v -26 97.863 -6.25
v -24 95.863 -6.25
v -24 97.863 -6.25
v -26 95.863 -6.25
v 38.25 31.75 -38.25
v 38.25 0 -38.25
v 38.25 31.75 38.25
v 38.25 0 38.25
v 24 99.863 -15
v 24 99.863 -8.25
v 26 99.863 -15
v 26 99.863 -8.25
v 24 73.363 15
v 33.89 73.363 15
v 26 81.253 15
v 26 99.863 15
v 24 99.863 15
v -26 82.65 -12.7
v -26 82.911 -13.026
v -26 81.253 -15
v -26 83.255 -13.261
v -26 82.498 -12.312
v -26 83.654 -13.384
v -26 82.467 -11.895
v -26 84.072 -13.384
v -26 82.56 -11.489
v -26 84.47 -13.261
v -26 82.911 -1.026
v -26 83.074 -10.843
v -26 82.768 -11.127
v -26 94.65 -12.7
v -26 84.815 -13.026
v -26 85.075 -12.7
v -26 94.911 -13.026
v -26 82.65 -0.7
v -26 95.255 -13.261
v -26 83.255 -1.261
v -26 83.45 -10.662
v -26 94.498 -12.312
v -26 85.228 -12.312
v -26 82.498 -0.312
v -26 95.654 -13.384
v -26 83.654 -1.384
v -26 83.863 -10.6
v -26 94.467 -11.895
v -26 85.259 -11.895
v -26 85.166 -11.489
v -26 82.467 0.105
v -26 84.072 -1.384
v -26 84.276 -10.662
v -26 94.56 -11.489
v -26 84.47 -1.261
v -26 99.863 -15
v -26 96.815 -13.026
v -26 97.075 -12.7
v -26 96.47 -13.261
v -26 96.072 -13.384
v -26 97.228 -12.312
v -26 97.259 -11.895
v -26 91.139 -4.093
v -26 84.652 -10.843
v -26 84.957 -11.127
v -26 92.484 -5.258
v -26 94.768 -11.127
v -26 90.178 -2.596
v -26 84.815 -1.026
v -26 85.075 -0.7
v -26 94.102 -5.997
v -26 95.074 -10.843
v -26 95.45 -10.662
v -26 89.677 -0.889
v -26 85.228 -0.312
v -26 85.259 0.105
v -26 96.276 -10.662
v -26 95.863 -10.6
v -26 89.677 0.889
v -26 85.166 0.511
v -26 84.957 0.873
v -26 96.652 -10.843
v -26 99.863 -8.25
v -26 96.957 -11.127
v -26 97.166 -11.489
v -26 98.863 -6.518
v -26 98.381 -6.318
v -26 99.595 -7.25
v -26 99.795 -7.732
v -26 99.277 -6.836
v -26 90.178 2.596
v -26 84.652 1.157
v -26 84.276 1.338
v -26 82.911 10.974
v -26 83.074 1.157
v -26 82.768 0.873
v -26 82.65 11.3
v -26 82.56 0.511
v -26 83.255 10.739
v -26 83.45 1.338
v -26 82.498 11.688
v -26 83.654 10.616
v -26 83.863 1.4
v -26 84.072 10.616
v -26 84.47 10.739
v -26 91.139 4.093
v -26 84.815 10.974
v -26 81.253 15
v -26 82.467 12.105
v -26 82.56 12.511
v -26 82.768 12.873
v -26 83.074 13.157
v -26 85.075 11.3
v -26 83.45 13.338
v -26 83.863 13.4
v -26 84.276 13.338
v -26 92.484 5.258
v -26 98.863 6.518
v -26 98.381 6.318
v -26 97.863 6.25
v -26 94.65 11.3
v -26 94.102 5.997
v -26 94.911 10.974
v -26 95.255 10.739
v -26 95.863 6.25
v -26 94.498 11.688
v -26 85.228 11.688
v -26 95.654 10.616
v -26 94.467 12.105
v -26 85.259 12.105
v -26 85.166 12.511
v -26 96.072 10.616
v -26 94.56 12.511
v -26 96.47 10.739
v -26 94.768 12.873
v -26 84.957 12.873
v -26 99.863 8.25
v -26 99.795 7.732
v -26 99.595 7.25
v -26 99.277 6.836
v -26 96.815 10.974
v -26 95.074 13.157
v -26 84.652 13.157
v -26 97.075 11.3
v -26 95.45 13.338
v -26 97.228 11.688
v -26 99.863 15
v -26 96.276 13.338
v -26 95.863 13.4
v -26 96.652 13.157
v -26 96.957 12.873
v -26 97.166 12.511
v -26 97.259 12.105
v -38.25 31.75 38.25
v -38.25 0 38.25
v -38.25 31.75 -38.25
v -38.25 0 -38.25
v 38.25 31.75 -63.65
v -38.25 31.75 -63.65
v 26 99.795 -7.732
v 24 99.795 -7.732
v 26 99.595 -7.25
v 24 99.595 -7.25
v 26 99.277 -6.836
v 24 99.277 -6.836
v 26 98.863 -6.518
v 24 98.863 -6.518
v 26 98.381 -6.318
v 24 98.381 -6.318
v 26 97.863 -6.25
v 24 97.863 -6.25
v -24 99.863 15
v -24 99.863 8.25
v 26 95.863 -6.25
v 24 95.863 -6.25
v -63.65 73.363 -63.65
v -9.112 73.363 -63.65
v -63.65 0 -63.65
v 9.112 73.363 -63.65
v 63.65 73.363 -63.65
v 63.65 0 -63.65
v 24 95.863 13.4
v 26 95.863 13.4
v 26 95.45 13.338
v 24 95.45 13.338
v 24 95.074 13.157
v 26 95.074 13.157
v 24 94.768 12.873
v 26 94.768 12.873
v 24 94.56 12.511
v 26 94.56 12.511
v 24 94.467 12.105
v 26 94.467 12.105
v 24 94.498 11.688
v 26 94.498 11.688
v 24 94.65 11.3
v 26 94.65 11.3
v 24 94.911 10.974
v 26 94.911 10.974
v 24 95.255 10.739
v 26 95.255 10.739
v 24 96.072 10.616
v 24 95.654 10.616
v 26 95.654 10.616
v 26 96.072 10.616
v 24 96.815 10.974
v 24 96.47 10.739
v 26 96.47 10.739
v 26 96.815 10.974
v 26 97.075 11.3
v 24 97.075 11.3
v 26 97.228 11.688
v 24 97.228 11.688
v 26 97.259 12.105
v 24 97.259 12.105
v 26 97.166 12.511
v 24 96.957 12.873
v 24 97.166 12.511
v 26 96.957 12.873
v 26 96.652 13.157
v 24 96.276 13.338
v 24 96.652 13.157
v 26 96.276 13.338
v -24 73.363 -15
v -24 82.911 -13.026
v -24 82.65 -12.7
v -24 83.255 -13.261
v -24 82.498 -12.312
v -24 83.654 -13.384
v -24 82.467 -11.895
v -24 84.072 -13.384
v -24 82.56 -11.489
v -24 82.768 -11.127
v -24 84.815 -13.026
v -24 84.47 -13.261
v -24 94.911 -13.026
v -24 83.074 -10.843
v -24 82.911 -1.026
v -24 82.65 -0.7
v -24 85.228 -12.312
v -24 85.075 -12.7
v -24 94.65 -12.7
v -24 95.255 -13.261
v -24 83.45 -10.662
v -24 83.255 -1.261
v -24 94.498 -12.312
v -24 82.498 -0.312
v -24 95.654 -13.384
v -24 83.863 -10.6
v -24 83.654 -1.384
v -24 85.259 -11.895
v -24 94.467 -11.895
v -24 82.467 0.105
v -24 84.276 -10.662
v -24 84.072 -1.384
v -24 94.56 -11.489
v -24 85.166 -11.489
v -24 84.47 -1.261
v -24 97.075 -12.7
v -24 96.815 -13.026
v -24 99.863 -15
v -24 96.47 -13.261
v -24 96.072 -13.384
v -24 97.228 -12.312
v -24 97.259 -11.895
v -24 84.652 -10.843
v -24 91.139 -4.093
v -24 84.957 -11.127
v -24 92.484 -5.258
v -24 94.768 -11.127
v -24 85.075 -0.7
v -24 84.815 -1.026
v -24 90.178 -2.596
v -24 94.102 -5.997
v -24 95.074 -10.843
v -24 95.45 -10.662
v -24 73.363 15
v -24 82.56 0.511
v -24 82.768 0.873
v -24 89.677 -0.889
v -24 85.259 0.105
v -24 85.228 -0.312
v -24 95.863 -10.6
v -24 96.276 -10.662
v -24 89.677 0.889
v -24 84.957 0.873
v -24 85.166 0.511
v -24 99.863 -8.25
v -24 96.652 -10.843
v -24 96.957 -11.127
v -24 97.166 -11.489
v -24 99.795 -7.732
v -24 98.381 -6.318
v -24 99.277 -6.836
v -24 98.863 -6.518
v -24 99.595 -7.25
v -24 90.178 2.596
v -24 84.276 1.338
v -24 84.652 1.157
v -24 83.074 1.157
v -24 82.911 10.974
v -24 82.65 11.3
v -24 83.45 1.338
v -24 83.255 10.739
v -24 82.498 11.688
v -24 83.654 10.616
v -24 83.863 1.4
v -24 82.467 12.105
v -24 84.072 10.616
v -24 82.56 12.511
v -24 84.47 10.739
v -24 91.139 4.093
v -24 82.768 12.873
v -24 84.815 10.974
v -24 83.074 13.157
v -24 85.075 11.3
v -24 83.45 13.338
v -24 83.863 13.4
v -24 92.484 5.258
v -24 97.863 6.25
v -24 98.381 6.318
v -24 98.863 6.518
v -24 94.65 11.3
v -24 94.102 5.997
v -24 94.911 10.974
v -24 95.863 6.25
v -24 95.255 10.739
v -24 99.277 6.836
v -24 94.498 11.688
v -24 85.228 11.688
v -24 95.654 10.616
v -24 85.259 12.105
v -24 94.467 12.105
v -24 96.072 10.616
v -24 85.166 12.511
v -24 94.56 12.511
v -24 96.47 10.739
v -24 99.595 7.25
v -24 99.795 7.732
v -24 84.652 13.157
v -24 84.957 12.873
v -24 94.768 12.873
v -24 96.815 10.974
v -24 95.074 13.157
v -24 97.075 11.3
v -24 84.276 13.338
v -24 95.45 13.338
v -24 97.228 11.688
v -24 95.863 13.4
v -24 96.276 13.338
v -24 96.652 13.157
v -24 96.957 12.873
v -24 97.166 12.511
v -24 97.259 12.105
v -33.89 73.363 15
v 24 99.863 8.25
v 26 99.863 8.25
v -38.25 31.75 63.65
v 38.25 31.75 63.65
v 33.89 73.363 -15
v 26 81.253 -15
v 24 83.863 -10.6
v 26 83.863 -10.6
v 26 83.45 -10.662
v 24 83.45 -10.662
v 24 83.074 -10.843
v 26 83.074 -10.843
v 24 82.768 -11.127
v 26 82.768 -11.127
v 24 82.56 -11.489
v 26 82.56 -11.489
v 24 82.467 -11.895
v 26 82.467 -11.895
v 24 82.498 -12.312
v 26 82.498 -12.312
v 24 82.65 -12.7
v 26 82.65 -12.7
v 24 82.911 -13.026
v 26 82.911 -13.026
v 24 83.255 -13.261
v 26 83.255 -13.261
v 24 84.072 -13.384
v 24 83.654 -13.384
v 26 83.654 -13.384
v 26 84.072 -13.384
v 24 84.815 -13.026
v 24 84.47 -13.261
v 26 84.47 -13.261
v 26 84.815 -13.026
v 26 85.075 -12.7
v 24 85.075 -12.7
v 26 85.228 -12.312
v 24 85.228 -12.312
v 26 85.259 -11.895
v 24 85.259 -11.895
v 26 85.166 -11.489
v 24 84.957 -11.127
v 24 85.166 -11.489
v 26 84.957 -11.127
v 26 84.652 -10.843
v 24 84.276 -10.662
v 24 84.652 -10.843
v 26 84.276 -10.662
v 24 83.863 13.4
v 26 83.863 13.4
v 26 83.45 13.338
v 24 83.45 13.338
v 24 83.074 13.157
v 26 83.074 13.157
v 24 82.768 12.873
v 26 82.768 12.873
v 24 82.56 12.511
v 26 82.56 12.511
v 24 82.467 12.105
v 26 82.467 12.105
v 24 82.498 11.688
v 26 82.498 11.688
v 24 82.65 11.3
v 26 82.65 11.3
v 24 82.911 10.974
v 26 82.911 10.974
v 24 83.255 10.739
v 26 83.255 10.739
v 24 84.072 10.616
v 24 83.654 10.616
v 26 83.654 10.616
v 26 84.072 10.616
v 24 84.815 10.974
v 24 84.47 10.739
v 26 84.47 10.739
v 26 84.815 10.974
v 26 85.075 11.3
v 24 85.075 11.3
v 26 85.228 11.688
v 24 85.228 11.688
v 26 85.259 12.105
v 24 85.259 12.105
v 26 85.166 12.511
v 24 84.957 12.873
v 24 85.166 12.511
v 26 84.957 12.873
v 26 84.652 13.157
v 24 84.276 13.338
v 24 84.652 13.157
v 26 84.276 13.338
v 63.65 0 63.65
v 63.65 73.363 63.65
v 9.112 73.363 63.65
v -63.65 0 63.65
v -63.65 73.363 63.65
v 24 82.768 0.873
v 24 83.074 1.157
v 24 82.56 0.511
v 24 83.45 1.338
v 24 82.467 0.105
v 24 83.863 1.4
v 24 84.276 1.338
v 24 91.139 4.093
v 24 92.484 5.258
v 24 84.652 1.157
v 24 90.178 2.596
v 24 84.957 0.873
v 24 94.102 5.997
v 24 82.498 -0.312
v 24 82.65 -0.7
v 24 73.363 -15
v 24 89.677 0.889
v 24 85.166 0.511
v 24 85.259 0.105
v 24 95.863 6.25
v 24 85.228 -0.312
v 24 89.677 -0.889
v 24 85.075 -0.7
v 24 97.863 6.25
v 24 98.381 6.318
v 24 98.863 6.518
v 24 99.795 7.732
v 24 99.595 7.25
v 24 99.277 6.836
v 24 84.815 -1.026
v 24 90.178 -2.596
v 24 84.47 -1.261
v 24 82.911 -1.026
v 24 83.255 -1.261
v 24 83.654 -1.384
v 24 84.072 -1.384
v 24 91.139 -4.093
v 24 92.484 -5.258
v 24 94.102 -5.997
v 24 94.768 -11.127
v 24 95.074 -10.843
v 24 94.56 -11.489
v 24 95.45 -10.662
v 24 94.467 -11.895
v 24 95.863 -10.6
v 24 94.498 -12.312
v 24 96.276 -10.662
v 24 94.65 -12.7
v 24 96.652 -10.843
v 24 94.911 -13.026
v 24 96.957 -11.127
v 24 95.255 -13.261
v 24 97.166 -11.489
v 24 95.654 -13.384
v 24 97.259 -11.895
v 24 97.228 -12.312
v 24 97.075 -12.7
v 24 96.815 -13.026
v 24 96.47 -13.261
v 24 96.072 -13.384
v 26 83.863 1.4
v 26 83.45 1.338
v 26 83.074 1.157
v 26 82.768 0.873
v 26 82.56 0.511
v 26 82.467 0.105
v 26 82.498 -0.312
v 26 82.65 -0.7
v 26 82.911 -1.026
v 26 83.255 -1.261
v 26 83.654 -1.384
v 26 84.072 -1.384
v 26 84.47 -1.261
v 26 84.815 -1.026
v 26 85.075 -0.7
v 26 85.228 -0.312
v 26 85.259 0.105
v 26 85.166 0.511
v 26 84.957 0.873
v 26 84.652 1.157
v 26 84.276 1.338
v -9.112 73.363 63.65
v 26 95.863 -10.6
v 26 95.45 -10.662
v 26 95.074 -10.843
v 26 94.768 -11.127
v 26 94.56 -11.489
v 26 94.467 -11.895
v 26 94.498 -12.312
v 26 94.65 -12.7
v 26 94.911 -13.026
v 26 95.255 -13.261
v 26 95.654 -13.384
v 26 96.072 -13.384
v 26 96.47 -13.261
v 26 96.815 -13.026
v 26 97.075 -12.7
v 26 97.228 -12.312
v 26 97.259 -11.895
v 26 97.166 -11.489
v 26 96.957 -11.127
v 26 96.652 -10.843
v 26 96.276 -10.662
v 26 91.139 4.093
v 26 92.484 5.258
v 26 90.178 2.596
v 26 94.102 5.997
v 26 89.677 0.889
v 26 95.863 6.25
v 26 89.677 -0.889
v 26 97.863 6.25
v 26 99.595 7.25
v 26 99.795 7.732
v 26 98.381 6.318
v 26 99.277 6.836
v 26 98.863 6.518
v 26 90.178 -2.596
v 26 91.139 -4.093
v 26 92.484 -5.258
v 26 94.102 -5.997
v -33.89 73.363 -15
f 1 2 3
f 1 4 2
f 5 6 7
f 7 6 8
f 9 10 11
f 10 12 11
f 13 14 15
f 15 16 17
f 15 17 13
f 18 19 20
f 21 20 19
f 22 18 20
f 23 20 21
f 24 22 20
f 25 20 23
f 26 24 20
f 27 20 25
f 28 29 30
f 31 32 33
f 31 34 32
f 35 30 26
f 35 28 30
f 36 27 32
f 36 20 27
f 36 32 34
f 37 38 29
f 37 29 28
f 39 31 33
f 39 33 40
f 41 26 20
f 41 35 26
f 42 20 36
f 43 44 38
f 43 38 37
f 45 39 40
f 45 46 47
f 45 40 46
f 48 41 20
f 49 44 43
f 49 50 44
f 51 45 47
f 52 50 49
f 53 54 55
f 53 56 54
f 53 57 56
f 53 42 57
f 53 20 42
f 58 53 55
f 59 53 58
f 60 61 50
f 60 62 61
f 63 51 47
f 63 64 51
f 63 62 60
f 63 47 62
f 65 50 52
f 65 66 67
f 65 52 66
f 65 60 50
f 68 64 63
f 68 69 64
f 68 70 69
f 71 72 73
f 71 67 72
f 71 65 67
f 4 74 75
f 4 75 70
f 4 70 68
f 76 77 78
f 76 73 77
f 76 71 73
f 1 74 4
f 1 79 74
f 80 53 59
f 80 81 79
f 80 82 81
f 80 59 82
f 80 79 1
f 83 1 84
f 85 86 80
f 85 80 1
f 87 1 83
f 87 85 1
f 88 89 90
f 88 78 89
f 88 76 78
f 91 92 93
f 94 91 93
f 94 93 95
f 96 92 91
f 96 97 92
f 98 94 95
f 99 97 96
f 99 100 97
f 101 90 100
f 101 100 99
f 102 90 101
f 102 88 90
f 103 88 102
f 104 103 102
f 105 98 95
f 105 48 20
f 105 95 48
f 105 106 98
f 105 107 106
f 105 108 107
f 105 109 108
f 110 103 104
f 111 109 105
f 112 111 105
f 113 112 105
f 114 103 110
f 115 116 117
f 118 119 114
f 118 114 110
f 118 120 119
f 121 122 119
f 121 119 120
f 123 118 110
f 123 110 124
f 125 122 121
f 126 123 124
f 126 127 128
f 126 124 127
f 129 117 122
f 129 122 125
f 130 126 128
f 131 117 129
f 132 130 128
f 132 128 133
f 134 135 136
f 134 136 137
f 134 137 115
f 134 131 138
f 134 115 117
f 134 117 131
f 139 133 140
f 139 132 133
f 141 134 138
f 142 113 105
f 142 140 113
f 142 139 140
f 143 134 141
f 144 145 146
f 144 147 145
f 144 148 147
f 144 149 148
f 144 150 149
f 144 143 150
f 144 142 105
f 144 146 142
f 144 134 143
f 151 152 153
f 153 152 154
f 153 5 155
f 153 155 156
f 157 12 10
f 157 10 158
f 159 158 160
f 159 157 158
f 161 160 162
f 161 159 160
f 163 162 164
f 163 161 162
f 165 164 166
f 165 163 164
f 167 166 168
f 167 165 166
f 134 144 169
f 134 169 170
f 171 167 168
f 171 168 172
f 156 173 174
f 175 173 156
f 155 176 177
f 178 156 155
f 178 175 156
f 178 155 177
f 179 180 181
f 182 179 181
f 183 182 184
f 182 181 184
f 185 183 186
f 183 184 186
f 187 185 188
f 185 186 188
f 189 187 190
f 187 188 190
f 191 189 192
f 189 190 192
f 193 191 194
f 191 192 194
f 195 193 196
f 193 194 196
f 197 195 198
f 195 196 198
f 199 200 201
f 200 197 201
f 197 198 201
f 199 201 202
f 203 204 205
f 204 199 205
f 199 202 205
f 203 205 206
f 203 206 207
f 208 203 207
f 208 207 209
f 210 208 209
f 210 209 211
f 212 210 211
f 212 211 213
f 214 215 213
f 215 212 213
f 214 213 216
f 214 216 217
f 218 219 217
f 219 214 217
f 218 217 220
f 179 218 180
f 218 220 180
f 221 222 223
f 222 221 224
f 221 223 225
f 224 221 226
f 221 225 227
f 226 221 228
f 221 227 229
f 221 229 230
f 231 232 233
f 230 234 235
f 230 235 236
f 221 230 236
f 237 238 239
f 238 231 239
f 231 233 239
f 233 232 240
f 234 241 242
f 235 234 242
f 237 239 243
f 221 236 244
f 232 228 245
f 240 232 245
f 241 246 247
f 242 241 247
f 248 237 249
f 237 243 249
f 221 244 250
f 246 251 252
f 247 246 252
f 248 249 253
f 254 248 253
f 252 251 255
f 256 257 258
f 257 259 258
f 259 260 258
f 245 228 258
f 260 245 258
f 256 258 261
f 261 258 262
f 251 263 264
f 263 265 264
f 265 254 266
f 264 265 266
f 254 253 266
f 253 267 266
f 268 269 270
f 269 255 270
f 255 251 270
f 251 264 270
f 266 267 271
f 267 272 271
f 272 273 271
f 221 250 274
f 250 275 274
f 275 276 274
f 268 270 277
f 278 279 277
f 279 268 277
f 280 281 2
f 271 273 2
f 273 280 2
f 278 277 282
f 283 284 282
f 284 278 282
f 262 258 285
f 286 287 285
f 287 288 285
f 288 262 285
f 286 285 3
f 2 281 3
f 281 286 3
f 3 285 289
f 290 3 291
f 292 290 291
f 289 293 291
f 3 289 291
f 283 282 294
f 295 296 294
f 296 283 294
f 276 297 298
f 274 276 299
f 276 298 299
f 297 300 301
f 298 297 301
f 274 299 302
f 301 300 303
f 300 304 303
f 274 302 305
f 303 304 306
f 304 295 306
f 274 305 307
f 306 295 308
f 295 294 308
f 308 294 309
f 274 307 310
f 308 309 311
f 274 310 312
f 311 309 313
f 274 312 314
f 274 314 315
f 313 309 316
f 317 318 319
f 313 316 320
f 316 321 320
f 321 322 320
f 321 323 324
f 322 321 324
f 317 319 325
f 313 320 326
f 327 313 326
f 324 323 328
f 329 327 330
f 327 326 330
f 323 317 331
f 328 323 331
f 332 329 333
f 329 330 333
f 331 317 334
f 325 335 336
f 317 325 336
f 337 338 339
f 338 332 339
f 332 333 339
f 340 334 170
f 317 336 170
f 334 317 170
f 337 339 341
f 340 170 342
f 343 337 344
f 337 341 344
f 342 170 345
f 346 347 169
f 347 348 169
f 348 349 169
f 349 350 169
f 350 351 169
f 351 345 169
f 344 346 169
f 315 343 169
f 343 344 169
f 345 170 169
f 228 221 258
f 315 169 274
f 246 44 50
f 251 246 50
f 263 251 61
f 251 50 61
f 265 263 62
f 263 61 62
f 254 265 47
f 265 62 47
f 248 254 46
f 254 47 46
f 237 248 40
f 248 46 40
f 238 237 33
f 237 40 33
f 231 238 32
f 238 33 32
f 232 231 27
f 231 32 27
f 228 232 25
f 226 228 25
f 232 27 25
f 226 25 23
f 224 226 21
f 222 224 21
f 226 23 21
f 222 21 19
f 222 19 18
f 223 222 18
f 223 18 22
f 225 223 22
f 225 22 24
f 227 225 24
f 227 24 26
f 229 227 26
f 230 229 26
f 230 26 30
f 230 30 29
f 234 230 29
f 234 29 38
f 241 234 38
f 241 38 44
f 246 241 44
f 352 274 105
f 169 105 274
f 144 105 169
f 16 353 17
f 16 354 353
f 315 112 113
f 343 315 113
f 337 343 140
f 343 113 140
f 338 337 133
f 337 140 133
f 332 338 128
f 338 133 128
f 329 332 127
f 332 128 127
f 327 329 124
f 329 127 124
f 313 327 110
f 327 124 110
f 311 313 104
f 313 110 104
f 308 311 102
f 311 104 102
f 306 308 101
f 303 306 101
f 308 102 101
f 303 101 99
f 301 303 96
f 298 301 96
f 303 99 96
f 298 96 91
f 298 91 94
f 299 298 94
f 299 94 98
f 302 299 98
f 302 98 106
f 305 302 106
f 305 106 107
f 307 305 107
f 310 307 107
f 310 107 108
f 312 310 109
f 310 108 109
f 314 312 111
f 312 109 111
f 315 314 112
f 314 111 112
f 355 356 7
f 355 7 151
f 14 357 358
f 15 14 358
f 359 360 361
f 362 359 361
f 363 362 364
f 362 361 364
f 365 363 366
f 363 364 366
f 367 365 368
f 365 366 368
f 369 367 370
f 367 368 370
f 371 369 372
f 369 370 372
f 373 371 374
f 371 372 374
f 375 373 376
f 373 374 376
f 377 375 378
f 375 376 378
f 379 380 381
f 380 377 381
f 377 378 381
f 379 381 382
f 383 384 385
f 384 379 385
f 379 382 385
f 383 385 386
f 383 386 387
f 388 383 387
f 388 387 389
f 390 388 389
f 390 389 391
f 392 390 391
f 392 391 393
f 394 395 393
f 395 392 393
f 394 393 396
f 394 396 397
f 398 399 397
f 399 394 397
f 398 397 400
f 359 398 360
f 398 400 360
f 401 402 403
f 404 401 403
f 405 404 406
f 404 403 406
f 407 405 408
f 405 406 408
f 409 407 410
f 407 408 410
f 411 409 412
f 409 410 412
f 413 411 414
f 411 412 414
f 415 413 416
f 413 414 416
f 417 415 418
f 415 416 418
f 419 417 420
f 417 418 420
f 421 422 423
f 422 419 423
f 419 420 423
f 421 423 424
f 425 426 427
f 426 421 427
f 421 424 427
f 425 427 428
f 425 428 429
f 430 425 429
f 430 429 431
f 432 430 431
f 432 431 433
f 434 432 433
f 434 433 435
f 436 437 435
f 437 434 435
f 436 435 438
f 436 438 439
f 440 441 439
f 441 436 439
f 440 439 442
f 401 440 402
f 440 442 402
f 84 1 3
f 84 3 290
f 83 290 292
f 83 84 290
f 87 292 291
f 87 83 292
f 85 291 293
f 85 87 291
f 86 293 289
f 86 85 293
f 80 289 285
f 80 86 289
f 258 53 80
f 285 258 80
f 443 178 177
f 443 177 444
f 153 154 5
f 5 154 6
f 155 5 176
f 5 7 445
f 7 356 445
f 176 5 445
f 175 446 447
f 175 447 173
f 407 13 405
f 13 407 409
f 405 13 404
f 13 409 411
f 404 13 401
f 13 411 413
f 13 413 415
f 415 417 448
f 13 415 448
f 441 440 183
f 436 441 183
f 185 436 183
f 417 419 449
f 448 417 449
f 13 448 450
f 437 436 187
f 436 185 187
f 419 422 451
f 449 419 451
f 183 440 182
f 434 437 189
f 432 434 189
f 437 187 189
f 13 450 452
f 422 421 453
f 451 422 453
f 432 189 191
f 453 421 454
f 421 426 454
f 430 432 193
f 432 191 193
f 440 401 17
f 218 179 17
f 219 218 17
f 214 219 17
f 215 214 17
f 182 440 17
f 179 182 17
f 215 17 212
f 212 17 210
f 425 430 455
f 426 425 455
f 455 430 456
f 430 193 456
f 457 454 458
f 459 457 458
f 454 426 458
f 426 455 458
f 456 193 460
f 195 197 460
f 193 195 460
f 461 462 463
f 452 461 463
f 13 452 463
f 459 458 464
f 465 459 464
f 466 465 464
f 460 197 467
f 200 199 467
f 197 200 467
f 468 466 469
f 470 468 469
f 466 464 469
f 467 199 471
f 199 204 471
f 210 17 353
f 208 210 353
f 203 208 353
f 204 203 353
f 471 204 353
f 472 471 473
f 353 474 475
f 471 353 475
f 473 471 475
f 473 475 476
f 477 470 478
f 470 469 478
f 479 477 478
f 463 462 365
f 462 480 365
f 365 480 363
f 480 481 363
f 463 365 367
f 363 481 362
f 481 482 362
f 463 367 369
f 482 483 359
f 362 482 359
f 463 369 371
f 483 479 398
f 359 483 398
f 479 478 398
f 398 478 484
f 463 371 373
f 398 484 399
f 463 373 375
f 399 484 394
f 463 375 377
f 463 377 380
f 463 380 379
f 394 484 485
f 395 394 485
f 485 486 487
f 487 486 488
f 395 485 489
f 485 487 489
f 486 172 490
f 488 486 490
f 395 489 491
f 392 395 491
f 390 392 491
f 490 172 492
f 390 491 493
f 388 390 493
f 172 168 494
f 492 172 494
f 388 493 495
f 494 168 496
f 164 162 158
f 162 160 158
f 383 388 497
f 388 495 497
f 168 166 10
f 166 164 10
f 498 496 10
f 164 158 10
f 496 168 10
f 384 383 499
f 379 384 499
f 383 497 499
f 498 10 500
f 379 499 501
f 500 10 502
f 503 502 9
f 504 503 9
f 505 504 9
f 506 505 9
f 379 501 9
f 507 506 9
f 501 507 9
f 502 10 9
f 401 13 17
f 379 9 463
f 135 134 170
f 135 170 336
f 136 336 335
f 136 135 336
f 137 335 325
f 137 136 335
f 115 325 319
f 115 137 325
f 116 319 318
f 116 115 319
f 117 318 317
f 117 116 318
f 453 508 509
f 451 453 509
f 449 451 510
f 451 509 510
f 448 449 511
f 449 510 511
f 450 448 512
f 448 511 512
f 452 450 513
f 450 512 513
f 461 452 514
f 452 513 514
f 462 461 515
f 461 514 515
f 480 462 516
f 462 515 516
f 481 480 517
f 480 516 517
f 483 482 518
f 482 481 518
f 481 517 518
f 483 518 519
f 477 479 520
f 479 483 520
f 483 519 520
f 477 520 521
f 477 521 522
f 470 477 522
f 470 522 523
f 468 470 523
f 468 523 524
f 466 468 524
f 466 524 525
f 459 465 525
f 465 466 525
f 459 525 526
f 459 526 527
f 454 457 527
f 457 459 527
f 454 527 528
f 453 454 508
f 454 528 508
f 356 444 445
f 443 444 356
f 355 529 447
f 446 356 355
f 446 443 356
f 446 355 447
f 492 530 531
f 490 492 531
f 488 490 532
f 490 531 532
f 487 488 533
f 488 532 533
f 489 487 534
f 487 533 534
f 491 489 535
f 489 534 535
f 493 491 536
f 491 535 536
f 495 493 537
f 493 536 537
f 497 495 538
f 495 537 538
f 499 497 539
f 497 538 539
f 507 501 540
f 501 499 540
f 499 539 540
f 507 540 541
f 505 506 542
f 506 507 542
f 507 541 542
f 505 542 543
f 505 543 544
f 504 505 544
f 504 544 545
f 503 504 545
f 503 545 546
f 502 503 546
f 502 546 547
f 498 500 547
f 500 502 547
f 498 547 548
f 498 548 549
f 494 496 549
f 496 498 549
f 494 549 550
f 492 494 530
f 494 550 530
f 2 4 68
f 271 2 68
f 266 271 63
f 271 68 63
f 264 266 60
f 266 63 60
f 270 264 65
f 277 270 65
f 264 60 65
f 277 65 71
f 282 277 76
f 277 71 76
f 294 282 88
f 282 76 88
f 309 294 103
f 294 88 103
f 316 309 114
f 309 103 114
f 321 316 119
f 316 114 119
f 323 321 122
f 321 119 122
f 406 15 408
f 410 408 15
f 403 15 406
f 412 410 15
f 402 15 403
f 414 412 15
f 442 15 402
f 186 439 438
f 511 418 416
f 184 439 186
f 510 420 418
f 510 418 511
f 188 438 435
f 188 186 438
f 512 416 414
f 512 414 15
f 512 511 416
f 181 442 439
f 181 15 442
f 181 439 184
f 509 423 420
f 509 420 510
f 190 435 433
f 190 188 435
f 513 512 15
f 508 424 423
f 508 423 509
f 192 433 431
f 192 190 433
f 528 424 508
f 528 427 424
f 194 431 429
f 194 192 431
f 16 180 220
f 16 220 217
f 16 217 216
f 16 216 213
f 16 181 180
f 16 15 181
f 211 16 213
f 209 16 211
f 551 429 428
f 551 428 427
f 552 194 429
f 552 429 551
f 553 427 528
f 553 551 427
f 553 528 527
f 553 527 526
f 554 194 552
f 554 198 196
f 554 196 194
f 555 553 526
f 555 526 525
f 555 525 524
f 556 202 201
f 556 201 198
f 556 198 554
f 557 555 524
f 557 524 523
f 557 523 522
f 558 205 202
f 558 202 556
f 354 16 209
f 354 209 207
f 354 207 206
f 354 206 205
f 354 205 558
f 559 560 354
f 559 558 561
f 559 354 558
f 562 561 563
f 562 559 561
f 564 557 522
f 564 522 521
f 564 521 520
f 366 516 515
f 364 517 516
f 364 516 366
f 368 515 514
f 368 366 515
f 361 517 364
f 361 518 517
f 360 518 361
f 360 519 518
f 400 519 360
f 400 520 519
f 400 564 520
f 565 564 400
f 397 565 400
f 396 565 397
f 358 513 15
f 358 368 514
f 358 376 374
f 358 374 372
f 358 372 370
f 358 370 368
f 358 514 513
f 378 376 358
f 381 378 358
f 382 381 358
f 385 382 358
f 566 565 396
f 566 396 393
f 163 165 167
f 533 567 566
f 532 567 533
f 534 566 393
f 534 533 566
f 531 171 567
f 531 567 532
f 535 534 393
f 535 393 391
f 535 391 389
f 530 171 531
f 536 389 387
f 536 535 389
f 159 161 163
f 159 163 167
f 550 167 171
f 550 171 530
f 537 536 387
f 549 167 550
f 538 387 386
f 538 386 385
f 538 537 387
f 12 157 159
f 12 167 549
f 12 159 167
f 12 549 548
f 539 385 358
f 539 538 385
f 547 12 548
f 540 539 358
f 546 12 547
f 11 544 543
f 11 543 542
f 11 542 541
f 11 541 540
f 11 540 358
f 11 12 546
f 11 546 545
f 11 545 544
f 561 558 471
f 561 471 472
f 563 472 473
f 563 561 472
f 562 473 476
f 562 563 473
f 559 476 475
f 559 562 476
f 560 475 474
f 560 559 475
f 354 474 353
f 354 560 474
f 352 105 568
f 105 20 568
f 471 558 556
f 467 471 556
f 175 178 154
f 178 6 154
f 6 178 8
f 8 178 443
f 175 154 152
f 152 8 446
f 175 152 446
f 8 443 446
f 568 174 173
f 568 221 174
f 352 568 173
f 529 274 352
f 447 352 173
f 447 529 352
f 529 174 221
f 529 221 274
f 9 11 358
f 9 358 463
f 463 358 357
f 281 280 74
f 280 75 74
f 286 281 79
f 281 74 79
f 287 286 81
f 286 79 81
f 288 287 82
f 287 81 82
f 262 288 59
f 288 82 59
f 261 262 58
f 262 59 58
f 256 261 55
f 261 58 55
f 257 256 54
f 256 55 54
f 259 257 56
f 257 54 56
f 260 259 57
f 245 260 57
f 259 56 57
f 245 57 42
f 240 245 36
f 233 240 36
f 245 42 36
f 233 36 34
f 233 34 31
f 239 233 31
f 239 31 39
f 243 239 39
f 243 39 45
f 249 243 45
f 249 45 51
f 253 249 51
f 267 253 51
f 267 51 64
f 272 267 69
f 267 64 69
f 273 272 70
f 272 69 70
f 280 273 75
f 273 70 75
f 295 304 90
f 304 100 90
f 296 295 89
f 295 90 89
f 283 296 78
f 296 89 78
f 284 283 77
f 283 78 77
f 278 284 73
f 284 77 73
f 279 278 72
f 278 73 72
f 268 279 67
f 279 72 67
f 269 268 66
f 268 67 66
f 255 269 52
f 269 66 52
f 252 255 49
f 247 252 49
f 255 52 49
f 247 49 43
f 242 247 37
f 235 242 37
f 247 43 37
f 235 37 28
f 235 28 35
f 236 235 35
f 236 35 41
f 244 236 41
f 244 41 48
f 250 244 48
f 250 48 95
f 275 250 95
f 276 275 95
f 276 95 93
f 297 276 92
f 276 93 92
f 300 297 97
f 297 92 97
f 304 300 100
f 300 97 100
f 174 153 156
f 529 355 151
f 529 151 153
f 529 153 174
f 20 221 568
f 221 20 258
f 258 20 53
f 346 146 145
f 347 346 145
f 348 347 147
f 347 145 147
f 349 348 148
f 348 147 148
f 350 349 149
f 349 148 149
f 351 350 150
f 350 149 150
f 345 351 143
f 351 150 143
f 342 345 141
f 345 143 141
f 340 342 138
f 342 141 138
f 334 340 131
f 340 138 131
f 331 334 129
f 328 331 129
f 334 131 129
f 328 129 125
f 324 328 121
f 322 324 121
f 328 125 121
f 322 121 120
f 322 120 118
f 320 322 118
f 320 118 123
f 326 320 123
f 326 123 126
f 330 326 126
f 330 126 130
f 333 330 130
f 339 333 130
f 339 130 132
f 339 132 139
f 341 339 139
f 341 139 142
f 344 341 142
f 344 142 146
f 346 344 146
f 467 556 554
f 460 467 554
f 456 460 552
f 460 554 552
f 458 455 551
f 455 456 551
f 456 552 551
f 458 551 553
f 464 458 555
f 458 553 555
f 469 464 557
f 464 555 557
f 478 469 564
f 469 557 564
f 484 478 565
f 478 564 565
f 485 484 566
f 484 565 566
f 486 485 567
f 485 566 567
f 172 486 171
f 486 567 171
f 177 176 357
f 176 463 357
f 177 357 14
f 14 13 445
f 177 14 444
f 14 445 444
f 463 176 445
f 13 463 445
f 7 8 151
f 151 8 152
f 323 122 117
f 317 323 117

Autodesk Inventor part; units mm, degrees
ref_plane "XZ Plane" through (0, 0, 0) normal (0, 1, 0) x (-1, 0, 0)
ref_plane "XY Plane" through (0, 0, 0) normal (0, 0, 1) x (1, 0, 0)
sketch "Sketch1" plane through (0, 0, 0) normal (0, 1, 0) x (-1, 0, 0)
  line L0 (-38.25, 38.25) -> (38.25, 38.25)
  line L1 (38.25, 38.25) -> (38.25, -38.25)
  line L2 (38.25, -38.25) -> (-38.25, -38.25)
  line L3 (-38.25, -38.25) -> (-38.25, 38.25)
  line L4 (63.65, -63.65) -> (-63.65, -63.65)
  line L5 (-63.65, -63.65) -> (-63.65, 63.65)
  line L6 (-63.65, 63.65) -> (63.65, 63.65)
  line L7 (63.65, 63.65) -> (63.65, -63.65)
  point P0 (0, 0)
  point P1 (38.25, 0)
  point P2 (0, -38.25)
  point P3 (63.65, 0)
  point P4 (0, -63.65)
  dimension "d0" = 76.5
  dimension "d1" = 76.5
  dimension "d2" = 25.4
  dimension "d3" = 25.4
extrude "Extrusion1" add sketch "Sketch1" along normal blind 31.75
sketch "Sketch2" plane through (-63.65, 0, 63.65) normal (0, 0, 1) x (1, 0, 0)
  line L0 (127.3, 0) -> (127.3, 31.75) construction
  line L1 (0, 31.75) -> (127.3, 31.75) construction
  line L2 (101.9, 0) -> (101.9, 31.75) construction
  line L3 (101.9, 31.75) -> (72.7623, 73.3629)
  line L4 (101.9, 31.75) -> (152.7, 31.75) construction
  line L5 (63.65, 0) -> (63.65, 31.75)
  line L6 (72.7623, 73.3629) -> (127.3, 73.3629)
  line L7 (127.3, 73.3629) -> (127.3, 31.75)
  line L8 (25.4, 31.75) -> (54.5377, 73.3629)
  line L9 (25.4, 31.75) -> (-25.4, 31.75) construction
  line L10 (54.5377, 73.3629) -> (0, 73.3629)
  line L11 (0, 73.3629) -> (0, 31.75)
  line L12 (0, 31.75) -> (127.3, 31.75)
  dimension "d6" = 125
  dimension "d7" = 50.8
extrude "Extrusion2" add sketch "Sketch2" against normal up to surface (127.3 mm away)
sketch "Sketch3" plane through (9.1123, 73.3629, 63.65) normal (0, 1, 0) x (1, 0, 0)
  line L0 (-33.1123, 48.65) -> (-33.1123, 78.65)
  line L1 (-33.1123, 78.65) -> (-35.1123, 78.65)
  line L2 (-35.1123, 78.65) -> (-35.1123, 48.65)
  line L3 (-35.1123, 48.65) -> (-33.1123, 48.65)
  line L4 (16.8877, 48.65) -> (16.8877, 78.65)
  line L5 (16.8877, 78.65) -> (14.8877, 78.65)
  line L6 (14.8877, 78.65) -> (14.8877, 48.65)
  line L7 (14.8877, 48.65) -> (16.8877, 48.65)
  line L8 (-18.2246, 0) -> (-18.2246, 127.3) construction
  line L9 (-33.1123, 63.65) -> (14.8877, 63.65) construction
  point P0 (-9.1123, 63.65)
  point P1 (-18.2246, 63.65)
  point P2 (-9.1123, 63.65)
  dimension "d10" = 30
  dimension "d11" = 2
  dimension "d12" = 30
  dimension "d13" = 2
  dimension "d14" = 48
extrude "Extrusion3" add sketch "Sketch3" along normal blind 2
sketch "Sketch4" plane through (-26, 73.3629, 15) normal (-1, 0, 0) x (0, 0, 1)
  line L0 (0, 0) -> (-30, 0) construction
  line L1 (-30, 2) -> (0, 2) construction
  line L2 (0, 2) -> (-30, 2) construction
  line L3 (0, 2) -> (0, 26.5)
  line L4 (-30, 0) -> (0, 0) construction
  line L5 (0, 0) -> (-30, 0)
  line L6 (-30, 0) -> (-30, 2)
  line L7 (0, 0) -> (0, 2)
  line L8 (-30, 2) -> (0, 2)
  line L9 (-30, 2) -> (-30, 26.5)
  arc A0 (-21.25, 22.5) -> (-8.75, 22.5) centre (-15, 22.5) ccw
  line L10 (-21.25, 22.5) -> (-21.25, 24.5)
  line L11 (-8.75, 22.5) -> (-8.75, 24.5)
  line L12 (-30, 26.5) -> (-23.25, 26.5)
  line L13 (0, 26.5) -> (-6.75, 26.5)
  arc A1 (-21.25, 24.5) -> (-23.25, 26.5) centre (-23.25, 24.5) ccw
  arc A2 (-6.75, 26.5) -> (-8.75, 24.5) centre (-6.75, 24.5) ccw
  circle A3 centre (-3, 22.5) radius 1.4
  circle A4 centre (-3, 10.5) radius 1.4
  circle A5 centre (-15, 10.5) radius 1.4
  circle A6 centre (-27, 10.5) radius 1.4
  circle A7 centre (-27, 22.5) radius 1.4
  line L14 (-27, 10.5) -> (-15, 10.5) construction
  line L15 (-15, 10.5) -> (-3, 10.5) construction
  point P0 (-15, -73.3629)
  point P1 (-15, 2)
  point P2 (-15, 16.25)
  dimension "d17" = 26.5
  dimension "d18" = 12.5
  dimension "d19" = 22.5
  dimension "d20" = 2
  dimension "d21" = 2.8
  dimension "d22" = 12
  dimension "d23" = 24
extrude "Extrusion4" add sketch "Sketch4" against normal blind 2 contours L8 L9 L12 A1 L10 A0 L11 A2 L13 L3
sketch "Sketch5" plane through (-24, 73.3629, -15) normal (0, 0, -1) x (-1, 0, 0)
  line L0 (2, 0) -> (0, 0) construction
  line L1 (1, 8.89) -> (9.89, 0)
  line L2 (-14.8877, 0) -> (39.65, 0) construction
  line L3 (1, 8.89) -> (13.5724, 8.89) construction
  line L4 (1, 8.89) -> (-7.89, 0)
  line L5 (1, 8.89) -> (13.5724, 8.89) construction
  line L6 (1, 8.89) -> (1, 0)
  line L7 (1, 0) -> (9.89, 0)
  point P0 (-24, -73.3629)
  dimension "d26" = 45
  dimension "d27" = 135
  dimension "d28" = 8.89
extrude "Extrusion5" add sketch "Sketch5" against normal up to surface (30 mm away)
mirror "Mirror1" about plane through (0, 0, 0) normal (1, 0, 0) of "Extrusion4", "Extrusion5"
properties part number "ADAPTER4BB"
